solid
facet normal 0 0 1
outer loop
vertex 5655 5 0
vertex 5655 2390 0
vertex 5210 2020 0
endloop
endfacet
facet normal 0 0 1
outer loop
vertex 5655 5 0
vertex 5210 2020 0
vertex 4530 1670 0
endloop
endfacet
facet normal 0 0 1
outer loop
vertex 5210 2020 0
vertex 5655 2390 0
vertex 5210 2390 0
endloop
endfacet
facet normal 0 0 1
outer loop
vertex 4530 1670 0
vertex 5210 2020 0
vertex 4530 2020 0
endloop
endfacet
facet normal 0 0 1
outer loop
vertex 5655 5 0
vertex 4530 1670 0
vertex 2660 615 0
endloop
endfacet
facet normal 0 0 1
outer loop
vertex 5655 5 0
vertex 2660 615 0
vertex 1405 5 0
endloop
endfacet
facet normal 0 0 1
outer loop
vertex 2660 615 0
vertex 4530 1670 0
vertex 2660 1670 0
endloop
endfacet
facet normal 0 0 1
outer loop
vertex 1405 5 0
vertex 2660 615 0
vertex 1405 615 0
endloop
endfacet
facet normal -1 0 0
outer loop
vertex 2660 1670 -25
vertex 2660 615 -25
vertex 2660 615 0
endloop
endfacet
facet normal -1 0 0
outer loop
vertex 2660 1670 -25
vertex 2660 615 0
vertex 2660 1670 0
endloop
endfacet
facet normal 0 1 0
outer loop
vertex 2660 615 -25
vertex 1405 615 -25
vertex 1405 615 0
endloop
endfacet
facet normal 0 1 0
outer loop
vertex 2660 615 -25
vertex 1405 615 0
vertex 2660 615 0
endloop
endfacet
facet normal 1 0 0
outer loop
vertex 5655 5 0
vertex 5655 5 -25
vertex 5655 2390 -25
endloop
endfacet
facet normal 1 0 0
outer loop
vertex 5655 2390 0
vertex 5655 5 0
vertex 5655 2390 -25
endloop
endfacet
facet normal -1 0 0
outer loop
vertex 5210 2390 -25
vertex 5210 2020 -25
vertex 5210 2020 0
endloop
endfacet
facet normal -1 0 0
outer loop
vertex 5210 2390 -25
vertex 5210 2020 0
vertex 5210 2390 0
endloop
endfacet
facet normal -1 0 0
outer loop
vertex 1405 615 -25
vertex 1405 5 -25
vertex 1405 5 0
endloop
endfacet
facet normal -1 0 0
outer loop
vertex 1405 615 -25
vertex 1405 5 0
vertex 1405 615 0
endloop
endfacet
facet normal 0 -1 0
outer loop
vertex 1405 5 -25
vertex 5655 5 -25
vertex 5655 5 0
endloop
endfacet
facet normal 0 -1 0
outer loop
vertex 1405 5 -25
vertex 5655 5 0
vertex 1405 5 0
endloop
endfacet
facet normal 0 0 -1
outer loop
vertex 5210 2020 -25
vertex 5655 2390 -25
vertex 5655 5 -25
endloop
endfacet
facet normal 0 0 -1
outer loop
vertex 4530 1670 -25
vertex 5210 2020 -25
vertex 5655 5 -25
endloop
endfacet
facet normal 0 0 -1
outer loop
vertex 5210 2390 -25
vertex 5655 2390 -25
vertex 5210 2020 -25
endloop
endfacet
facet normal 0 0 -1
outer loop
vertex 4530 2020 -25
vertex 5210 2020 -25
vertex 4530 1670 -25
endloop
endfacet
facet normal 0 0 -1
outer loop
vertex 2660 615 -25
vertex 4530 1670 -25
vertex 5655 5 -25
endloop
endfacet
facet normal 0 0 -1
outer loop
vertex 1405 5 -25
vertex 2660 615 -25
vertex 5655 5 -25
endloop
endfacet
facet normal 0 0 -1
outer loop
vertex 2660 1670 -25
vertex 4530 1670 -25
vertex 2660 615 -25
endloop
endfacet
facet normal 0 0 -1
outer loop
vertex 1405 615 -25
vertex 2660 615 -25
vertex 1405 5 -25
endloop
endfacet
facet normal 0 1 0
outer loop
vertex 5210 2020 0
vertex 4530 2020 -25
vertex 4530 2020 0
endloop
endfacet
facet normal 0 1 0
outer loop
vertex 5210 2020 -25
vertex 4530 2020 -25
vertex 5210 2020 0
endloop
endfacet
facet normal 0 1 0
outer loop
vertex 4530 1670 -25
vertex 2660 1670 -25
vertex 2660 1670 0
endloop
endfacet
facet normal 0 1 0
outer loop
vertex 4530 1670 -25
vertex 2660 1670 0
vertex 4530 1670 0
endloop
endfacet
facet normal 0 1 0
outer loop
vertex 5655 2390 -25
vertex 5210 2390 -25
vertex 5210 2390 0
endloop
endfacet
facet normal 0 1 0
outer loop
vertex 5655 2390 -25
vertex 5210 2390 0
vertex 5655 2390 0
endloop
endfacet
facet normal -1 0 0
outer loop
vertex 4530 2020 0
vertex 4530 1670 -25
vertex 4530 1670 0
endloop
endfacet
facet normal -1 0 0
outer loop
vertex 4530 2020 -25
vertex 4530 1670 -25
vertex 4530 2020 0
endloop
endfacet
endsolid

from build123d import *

# Parameters (mm, degrees)
TABAN_FLAN_1_DEPTH         = 25
KES_EKSTR_ZYON1_DEPTH      = 6508.676543898
KES_EKSTR_ZYON1_DEPTH_BACK = 6508.676543898
IZIM7_W                    = 1400
IZIM7_H                    = 1895
IZIM7_W_2                  = 310
IZIM7_H_2                  = 495
KES_EKSTR_ZYON2_DEPTH      = 6508.676543898
KES_EKSTR_ZYON2_DEPTH_BACK = 6508.676543898
IZIM8_W                    = 292
IZIM8_H                    = 2515
KES_EKSTR_ZYON3_DEPTH      = 6240.38698912
KES_EKSTR_ZYON3_DEPTH_BACK = 6240.38698912
IZIM10_W                   = 2900
IZIM10_H                   = 350
KES_EKSTR_ZYON4_DEPTH      = 6240.38698912
KES_EKSTR_ZYON4_DEPTH_BACK = 6240.38698912
KES_EKSTR_ZYON5_DEPTH      = 6191.05856192
KES_EKSTR_ZYON5_DEPTH_BACK = 6191.05856192
IZIM12_W                   = 5
IZIM12_H                   = 615
KES_EKSTR_ZYON6_DEPTH      = 6191.05856192
KES_EKSTR_ZYON6_DEPTH_BACK = 6191.05856192
IZIM13_W                   = 55
IZIM13_H                   = 2385


# Sheet-metal steps are written as plain solids
with BuildPart() as part:
    # Çizim1 → Taban-Flanş1 (new body)
    with BuildSketch(Plane.XY):
        Polygon((0, 0), (0, 1895), (2935, 1895), (2935, 2020), (4900, 2020), (4900, 2515), (6002, 2515), (6002, 0), align=None)
    extrude(amount=-TABAN_FLAN_1_DEPTH)

    # Çizim7 → Kes-Ekstrüzyon1 (cut, two sides: drawn at the far end of the back side and taken through both)
    with BuildSketch(Plane.XY.offset(-KES_EKSTR_ZYON1_DEPTH_BACK)):
        with Locations((700, 947.5)):
            Rectangle(IZIM7_W, IZIM7_H)
        with Locations((5055, 2267.5)):
            Rectangle(IZIM7_W_2, IZIM7_H_2)
    extrude(amount=KES_EKSTR_ZYON1_DEPTH + KES_EKSTR_ZYON1_DEPTH_BACK, mode=Mode.SUBTRACT)

    # Çizim8 → Kes-Ekstrüzyon2 (cut, two sides: drawn at the far end of the back side and taken through both)
    with BuildSketch(Plane.XY.offset(-KES_EKSTR_ZYON2_DEPTH_BACK)):
        with Locations((5856, 1257.5)):
            Rectangle(IZIM8_W, IZIM8_H)
    extrude(amount=KES_EKSTR_ZYON2_DEPTH + KES_EKSTR_ZYON2_DEPTH_BACK, mode=Mode.SUBTRACT)

    # Çizim10 → Kes-Ekstrüzyon3 (cut, two sides: drawn at the far end of the back side and taken through both)
    with BuildSketch(Plane.XY.offset(-KES_EKSTR_ZYON3_DEPTH_BACK)):
        with Locations((2850, 1845)):
            Rectangle(IZIM10_W, IZIM10_H)
    extrude(amount=KES_EKSTR_ZYON3_DEPTH + KES_EKSTR_ZYON3_DEPTH_BACK, mode=Mode.SUBTRACT)

    # Çizim11 → Kes-Ekstrüzyon4 (cut, two sides: drawn at the far end of the back side and taken through both)
    with BuildSketch(Plane.XY.offset(-KES_EKSTR_ZYON4_DEPTH_BACK)):
        Polygon((4300, 1670), (4530, 1670), (4530, 2020), (5210, 2020), (5210, 2390), (5710, 2390), (5778.630385148, 2406.496682207), (5749.815338653, 2697.266696836), (5189.231706845, 2697.266696836), (4530, 2199.552257381), (4300, 2199.552257381), align=None)
    extrude(amount=KES_EKSTR_ZYON4_DEPTH + KES_EKSTR_ZYON4_DEPTH_BACK, mode=Mode.SUBTRACT)

    # Çizim12 → Kes-Ekstrüzyon5 (cut, two sides: drawn at the far end of the back side and taken through both)
    with BuildSketch(Plane.XY.offset(-KES_EKSTR_ZYON5_DEPTH_BACK)):
        Polygon((2660, 1670), (1400, 1670), (1400, 615), (1405, 615), (2660, 615), align=None)
        with Locations((1402.5, 307.5)):
            Rectangle(IZIM12_W, IZIM12_H)
    extrude(amount=KES_EKSTR_ZYON5_DEPTH + KES_EKSTR_ZYON5_DEPTH_BACK, mode=Mode.SUBTRACT)

    # Çizim13 → Kes-Ekstrüzyon6 (cut, two sides: drawn at the far end of the back side and taken through both)
    with BuildSketch(Plane.XY.offset(-KES_EKSTR_ZYON6_DEPTH_BACK)):
        with Locations((5682.5, 1197.5)):
            Rectangle(IZIM13_W, IZIM13_H)
        Polygon((1405, 0), (5710, 0), (5710, 5), (5655, 5), (1405, 5), align=None)
    extrude(amount=KES_EKSTR_ZYON6_DEPTH + KES_EKSTR_ZYON6_DEPTH_BACK, mode=Mode.SUBTRACT)


solid = part.part
